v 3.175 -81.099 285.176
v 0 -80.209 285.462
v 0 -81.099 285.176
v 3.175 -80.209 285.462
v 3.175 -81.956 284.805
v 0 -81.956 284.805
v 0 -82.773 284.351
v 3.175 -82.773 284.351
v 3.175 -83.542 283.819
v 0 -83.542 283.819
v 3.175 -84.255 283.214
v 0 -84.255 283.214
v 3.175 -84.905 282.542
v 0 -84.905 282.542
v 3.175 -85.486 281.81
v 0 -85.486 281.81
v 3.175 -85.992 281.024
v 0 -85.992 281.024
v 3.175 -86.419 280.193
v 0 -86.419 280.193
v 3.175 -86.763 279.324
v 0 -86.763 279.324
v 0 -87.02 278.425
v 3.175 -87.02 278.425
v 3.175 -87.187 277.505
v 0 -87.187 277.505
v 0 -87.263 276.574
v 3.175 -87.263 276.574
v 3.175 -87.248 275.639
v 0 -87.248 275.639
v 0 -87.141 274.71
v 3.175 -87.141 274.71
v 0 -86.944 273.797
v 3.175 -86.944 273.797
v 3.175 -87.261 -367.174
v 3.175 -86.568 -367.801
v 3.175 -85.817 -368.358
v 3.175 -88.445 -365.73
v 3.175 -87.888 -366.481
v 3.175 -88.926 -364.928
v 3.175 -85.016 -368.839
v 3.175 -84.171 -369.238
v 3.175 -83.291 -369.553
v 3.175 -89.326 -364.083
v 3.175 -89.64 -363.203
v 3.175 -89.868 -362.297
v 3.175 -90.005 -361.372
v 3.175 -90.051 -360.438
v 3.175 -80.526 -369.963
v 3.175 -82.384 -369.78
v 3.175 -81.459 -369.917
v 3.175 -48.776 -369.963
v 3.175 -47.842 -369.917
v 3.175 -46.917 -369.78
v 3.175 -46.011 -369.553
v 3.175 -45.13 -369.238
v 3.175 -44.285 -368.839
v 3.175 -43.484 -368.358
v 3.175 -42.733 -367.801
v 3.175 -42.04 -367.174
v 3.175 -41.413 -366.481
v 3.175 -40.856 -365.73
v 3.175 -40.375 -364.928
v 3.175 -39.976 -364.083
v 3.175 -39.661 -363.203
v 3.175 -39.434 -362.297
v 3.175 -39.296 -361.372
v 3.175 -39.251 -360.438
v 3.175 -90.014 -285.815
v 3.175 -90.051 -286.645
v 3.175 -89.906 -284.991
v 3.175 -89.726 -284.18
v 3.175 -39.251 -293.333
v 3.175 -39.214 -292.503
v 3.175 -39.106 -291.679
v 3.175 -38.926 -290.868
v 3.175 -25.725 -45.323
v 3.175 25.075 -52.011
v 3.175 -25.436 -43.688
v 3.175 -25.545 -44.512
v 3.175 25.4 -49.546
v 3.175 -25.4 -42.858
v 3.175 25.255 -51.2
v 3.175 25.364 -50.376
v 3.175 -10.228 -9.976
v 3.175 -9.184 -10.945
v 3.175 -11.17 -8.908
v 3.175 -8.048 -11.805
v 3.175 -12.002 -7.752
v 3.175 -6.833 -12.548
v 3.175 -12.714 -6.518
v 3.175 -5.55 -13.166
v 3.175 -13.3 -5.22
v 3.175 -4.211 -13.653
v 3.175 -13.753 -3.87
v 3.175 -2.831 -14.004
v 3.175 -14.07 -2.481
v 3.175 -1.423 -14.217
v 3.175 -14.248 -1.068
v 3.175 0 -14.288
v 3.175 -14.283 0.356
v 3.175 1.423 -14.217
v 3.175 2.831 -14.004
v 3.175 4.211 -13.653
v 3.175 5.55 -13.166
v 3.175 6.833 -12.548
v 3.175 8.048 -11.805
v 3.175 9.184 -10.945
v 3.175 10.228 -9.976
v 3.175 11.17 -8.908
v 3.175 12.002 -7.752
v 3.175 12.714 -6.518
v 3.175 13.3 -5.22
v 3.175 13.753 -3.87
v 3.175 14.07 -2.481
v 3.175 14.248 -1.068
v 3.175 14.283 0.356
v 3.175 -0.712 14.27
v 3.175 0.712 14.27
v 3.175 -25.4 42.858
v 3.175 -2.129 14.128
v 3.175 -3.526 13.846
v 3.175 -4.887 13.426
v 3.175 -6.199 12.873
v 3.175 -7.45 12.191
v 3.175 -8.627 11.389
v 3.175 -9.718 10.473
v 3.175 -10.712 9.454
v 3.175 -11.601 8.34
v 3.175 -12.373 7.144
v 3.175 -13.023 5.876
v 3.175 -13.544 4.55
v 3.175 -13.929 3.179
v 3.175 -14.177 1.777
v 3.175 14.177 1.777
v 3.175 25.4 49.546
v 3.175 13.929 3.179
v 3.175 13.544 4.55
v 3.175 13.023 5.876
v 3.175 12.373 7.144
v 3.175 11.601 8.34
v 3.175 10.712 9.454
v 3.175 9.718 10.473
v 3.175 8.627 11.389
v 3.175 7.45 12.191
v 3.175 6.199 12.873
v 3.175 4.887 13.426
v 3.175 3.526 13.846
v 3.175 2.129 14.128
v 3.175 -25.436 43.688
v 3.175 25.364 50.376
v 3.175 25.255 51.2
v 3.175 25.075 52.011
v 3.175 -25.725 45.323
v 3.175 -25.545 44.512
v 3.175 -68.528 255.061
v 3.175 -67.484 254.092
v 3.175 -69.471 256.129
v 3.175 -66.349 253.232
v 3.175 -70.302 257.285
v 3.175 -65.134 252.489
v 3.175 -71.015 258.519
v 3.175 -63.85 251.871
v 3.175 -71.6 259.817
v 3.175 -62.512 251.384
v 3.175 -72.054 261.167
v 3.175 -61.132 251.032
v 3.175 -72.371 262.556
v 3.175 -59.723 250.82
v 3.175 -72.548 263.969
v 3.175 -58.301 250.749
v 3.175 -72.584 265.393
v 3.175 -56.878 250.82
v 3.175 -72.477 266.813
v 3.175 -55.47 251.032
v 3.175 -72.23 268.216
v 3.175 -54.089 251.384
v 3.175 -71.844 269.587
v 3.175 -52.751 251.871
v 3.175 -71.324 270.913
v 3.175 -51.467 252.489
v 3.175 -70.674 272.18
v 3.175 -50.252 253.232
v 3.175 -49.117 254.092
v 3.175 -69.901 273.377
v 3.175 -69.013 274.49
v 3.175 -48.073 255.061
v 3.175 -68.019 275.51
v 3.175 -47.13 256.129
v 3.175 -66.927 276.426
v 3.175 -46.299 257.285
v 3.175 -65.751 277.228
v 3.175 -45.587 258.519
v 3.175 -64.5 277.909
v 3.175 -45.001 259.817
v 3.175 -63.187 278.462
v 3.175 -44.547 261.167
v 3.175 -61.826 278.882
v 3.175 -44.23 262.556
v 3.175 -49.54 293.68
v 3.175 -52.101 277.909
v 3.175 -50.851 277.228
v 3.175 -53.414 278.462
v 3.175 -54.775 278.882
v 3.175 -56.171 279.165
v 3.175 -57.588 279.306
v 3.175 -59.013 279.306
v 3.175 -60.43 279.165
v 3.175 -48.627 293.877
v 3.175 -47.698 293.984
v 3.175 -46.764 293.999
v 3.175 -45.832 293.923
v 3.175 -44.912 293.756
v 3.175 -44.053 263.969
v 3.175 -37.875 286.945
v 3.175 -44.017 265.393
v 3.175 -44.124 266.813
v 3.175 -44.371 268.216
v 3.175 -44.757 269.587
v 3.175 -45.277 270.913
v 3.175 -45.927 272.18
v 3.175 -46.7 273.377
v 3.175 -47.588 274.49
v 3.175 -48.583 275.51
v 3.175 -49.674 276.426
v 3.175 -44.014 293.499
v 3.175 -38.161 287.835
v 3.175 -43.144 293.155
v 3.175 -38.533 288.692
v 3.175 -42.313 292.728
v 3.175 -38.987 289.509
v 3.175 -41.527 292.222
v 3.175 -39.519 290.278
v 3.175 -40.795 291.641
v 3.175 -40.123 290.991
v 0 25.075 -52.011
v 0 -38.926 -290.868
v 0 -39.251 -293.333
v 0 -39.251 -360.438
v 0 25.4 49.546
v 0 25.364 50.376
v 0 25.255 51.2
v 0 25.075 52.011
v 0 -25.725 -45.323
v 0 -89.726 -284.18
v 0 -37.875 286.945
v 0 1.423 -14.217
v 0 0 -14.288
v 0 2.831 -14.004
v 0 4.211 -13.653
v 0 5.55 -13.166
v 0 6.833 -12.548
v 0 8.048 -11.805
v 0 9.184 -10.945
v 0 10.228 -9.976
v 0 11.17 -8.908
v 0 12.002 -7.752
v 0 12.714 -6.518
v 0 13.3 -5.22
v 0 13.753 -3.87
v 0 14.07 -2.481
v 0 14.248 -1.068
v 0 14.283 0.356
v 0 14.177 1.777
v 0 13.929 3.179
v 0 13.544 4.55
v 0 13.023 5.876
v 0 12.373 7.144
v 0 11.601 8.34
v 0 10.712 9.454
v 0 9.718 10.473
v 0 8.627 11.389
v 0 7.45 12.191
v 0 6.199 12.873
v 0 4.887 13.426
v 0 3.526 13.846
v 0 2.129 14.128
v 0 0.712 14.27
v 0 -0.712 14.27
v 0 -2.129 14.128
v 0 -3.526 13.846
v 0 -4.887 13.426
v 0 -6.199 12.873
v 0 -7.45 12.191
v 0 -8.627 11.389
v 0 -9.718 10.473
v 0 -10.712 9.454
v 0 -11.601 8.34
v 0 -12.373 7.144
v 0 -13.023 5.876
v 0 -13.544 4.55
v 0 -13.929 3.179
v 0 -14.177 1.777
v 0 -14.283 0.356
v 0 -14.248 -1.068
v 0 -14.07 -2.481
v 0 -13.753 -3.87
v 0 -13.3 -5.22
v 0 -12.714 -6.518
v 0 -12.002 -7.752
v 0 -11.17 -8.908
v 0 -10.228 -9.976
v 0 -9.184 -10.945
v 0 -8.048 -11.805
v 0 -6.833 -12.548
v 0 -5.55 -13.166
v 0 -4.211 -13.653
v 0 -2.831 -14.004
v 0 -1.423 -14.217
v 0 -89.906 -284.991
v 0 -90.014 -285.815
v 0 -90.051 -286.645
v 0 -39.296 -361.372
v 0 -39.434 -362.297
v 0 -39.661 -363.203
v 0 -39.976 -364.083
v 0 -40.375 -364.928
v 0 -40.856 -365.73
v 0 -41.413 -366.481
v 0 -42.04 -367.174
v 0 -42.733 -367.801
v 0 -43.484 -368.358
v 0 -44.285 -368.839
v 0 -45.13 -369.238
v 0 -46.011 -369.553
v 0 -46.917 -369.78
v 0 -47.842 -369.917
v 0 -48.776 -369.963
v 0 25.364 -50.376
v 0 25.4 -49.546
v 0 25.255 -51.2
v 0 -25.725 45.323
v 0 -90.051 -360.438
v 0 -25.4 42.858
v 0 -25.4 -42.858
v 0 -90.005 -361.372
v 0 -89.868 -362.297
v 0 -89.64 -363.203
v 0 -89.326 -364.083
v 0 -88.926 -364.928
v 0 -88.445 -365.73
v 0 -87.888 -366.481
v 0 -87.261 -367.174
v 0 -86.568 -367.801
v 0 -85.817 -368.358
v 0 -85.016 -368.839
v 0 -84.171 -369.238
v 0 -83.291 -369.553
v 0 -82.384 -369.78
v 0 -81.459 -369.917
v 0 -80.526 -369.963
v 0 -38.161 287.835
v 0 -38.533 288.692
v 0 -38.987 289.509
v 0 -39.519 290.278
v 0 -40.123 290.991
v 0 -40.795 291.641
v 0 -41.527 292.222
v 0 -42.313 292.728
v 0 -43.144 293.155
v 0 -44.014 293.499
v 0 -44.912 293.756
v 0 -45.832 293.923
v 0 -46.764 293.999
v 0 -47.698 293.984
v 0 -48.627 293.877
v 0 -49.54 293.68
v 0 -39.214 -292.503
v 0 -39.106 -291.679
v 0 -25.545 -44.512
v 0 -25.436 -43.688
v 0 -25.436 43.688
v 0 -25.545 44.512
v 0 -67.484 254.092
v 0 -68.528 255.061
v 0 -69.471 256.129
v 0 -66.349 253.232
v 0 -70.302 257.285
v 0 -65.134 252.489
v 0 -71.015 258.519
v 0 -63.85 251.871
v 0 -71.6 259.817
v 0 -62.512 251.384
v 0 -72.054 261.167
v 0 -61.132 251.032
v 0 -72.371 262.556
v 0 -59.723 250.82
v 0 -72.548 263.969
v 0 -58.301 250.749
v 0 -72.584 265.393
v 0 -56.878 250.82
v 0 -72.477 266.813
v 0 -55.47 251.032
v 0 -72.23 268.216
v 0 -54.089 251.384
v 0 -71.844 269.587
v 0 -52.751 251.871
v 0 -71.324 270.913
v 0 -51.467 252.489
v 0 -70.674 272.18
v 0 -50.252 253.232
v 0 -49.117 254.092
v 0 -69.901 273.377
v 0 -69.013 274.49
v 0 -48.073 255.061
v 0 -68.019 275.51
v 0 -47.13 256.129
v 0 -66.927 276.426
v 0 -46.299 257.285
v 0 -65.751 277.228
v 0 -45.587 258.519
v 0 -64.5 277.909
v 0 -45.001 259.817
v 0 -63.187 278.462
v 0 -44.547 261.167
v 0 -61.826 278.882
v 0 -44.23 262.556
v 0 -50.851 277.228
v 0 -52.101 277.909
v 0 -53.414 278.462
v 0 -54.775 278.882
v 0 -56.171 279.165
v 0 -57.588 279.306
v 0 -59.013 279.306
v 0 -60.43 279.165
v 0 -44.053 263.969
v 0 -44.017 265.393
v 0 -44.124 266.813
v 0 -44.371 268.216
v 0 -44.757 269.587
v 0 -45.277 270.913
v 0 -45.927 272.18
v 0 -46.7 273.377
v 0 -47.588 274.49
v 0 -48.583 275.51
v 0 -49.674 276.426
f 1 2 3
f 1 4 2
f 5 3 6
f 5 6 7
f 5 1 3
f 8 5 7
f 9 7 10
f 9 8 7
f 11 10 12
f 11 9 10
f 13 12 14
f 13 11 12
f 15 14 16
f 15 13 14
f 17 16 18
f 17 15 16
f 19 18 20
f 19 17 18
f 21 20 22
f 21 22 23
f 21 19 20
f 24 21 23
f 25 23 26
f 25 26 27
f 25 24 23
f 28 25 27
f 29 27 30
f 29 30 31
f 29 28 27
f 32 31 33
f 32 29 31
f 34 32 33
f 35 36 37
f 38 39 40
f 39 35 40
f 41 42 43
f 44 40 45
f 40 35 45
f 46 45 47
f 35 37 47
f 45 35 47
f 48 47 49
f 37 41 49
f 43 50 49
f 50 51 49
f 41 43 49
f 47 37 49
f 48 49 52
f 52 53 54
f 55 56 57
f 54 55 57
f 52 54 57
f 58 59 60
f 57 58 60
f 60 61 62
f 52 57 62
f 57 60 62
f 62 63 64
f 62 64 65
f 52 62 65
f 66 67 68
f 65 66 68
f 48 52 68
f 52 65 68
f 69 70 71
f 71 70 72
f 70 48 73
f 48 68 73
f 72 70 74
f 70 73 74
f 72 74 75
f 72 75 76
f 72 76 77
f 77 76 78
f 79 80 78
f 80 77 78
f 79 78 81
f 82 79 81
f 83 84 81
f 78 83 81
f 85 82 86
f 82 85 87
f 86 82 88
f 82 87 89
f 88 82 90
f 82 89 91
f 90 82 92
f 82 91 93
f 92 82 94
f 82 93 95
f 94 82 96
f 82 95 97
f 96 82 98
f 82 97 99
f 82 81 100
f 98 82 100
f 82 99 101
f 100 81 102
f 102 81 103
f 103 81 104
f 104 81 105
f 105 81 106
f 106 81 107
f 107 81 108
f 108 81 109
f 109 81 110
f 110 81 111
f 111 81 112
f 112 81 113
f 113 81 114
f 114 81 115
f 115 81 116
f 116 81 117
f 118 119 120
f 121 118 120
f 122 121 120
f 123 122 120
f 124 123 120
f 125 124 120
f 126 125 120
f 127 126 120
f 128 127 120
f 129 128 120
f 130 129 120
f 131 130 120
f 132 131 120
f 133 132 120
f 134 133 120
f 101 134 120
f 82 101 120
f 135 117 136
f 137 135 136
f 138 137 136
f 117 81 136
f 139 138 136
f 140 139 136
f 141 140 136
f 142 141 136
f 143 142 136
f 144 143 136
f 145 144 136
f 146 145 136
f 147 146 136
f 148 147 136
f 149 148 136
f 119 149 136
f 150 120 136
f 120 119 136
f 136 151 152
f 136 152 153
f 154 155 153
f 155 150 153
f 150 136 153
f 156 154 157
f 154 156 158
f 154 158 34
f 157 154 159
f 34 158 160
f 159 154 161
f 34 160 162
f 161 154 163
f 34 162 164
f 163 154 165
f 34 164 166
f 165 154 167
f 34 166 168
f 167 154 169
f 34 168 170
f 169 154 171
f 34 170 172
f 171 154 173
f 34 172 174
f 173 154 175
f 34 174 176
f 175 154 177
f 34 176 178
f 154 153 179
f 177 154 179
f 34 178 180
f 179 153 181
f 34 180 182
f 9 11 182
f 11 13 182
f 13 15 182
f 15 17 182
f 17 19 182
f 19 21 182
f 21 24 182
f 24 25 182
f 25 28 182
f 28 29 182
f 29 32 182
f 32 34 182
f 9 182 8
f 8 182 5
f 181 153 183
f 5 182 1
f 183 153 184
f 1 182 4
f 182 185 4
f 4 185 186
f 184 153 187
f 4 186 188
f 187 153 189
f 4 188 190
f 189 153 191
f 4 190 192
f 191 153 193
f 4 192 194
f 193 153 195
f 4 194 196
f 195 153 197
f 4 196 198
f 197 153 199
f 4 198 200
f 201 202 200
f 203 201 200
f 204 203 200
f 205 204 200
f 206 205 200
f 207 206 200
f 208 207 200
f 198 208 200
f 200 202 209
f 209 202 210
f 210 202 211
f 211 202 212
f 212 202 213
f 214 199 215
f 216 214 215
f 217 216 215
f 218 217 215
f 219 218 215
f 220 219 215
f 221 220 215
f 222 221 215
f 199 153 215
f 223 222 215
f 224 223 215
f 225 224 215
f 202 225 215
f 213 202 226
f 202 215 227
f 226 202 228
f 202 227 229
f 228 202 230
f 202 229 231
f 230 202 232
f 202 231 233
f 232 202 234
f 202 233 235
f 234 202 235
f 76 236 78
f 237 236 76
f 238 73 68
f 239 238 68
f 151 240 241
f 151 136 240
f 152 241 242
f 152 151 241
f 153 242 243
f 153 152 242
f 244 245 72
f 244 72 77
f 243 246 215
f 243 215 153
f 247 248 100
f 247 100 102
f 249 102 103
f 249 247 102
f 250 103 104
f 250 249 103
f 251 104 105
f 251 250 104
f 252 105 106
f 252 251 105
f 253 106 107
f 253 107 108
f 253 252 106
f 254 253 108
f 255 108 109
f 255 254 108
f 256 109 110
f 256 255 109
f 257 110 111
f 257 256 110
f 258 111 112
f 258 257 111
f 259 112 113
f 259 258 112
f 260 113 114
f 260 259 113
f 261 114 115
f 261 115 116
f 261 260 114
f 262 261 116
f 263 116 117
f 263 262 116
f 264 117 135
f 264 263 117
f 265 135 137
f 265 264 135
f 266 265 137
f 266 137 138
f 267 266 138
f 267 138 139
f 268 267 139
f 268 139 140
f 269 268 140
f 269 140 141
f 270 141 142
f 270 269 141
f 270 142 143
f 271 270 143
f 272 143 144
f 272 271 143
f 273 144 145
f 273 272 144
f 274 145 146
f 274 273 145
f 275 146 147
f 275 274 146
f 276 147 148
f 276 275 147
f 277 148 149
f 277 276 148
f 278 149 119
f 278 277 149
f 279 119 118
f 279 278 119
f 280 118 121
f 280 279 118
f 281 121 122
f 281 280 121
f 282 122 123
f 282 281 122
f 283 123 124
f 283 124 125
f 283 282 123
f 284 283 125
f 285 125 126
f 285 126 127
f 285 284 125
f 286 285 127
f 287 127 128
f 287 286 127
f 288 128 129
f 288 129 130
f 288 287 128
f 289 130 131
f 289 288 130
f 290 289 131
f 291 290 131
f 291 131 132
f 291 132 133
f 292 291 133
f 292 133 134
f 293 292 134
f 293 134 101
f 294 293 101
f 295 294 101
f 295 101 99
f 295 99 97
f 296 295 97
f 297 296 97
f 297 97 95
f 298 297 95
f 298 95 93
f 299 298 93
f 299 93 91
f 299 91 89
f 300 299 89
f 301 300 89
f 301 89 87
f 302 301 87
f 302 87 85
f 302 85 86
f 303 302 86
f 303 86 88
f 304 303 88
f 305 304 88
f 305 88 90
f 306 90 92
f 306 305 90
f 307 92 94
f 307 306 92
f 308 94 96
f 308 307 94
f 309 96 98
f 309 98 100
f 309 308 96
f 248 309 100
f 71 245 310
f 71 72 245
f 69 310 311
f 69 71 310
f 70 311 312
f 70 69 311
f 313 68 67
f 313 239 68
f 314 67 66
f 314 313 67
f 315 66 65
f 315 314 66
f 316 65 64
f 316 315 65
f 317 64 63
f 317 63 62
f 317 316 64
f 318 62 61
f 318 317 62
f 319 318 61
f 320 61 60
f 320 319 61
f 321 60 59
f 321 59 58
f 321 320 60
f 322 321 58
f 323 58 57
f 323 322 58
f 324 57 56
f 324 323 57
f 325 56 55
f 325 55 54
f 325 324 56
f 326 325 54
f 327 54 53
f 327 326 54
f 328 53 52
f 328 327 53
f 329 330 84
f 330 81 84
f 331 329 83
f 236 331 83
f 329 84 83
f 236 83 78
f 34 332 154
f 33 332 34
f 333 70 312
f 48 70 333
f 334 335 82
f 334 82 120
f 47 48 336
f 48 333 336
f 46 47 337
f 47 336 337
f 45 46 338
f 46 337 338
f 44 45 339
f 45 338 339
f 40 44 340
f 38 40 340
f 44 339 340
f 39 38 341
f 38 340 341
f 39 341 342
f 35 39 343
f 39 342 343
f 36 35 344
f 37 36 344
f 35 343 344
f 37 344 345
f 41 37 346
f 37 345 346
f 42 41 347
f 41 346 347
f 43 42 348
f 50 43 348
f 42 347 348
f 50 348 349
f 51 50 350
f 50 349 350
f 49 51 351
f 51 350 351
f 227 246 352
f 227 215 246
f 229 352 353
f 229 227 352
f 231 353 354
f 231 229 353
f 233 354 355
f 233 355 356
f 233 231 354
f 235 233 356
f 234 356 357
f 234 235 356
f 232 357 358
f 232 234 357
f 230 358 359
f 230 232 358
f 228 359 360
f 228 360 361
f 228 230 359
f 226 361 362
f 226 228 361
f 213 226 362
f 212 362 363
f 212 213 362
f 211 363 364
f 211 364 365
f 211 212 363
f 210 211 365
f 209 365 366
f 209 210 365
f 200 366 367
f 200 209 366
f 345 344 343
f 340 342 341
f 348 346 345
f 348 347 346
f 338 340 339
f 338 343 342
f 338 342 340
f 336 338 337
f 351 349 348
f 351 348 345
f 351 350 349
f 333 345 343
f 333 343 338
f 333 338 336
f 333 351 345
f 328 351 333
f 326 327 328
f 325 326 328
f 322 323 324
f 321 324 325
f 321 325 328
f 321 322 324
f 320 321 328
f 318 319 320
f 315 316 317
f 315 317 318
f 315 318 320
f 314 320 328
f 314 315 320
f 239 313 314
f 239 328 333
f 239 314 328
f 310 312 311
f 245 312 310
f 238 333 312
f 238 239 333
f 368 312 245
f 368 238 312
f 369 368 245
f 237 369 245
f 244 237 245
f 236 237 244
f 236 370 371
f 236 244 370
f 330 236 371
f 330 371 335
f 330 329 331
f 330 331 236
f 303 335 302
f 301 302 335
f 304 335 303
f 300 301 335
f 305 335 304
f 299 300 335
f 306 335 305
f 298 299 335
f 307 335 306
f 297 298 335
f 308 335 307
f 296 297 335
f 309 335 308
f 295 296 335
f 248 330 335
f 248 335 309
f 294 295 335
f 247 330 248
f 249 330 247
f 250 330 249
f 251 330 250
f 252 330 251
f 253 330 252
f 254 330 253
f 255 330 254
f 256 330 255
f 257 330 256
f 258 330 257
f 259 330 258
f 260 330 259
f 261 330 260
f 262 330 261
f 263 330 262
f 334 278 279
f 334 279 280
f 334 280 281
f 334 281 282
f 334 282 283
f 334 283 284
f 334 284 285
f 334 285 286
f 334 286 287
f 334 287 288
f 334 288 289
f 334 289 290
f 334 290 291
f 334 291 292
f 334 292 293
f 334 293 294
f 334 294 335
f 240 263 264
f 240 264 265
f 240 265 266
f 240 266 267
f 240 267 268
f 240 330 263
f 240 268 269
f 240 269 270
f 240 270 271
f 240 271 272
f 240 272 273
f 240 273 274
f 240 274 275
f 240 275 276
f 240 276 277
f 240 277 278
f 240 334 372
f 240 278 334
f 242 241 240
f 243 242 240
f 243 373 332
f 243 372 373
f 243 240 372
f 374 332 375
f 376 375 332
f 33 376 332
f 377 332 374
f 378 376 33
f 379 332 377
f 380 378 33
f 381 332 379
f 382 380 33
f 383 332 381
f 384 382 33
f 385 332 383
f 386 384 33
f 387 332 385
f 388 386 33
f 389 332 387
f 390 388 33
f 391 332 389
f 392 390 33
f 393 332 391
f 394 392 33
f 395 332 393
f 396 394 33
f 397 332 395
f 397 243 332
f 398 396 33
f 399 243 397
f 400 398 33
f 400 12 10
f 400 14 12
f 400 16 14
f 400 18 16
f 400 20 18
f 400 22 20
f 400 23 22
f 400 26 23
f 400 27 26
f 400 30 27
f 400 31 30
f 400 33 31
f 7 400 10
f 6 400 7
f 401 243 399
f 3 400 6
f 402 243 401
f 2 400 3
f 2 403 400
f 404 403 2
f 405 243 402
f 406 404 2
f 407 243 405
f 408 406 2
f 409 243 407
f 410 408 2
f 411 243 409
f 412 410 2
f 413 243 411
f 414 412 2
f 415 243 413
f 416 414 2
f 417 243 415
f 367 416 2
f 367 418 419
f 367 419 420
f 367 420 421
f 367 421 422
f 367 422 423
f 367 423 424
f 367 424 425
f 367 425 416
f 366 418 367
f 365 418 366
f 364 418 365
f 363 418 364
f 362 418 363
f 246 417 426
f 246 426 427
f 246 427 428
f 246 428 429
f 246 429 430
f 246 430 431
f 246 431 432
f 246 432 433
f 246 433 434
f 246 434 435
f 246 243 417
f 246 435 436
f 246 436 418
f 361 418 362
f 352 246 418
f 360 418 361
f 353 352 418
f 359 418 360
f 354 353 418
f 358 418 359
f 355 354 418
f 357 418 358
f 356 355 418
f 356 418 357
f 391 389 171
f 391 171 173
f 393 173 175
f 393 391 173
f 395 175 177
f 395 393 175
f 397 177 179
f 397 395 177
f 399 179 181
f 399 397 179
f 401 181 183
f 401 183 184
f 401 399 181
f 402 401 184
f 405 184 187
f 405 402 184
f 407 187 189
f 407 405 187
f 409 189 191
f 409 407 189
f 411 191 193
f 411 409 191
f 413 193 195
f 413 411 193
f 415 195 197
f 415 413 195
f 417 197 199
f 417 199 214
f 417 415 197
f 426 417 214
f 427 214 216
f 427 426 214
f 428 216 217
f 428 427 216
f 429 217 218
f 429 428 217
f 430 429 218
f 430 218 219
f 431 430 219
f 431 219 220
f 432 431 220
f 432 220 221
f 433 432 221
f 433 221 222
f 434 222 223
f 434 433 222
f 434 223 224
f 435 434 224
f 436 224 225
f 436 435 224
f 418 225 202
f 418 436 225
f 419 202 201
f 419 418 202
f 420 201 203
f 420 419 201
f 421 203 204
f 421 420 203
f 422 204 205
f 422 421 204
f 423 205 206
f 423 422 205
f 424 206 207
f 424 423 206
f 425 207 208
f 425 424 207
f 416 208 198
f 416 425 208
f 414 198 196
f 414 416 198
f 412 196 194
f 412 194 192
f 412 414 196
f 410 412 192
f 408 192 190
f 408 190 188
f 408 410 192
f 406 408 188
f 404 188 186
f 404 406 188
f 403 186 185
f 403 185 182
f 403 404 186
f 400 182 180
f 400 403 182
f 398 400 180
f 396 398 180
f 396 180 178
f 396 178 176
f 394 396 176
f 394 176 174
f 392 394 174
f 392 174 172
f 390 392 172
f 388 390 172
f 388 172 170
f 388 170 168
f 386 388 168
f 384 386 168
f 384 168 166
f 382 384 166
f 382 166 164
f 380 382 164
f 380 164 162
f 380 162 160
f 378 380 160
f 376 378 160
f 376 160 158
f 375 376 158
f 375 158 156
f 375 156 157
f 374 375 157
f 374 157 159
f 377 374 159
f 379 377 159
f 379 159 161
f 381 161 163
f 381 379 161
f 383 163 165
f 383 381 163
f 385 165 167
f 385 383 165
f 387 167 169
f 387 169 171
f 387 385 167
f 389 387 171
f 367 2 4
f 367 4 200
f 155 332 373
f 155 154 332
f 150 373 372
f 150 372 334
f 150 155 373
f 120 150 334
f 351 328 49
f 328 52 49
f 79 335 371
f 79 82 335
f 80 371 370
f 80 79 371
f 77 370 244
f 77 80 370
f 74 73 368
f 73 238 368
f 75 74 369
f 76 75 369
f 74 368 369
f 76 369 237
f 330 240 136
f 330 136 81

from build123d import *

# Parameters (mm, degrees)
SKETCH1_R           = 14.2875
BOSS_EXTRUDE1_DEPTH = 3.175
SKETCH3_R           = 12.7
CUT_EXTRUDE2_DEPTH  = 4.175
SKETCH5_W           = 50.8
SKETCH5_H           = 247.65
CUT_EXTRUDE4_DEPTH  = 4.175
SKETCH6_W           = 127
SKETCH6_H           = 25.4
CUT_EXTRUDE5_DEPTH  = 4.175
BOSS_EXTRUDE2_DEPTH = 3.175
FILLET1_R           = 9.525


with BuildPart() as part:
    # Sketch1 → Boss-Extrude1 (new body)
    with BuildSketch(Plane(origin=(0, 0, 0), x_dir=(0, 0, -1), z_dir=(1, 0, 0))):
        Polygon((-50.8, 25.4), (50.8, 25.4), (369.963359856, -60.119564527), (369.963359856, -337.700549698), (319.163359856, -337.700549698), (319.163359856, -99.099775516), (44.112053123, -25.4), (-44.112053123, -25.4), (-282.997152386, -89.409069432), (-296.145159877, -40.340037456), align=None)
        with Locations((-265.036640144, -58.300549698)):
            Circle(SKETCH1_R, mode=Mode.SUBTRACT)
        Circle(SKETCH1_R, mode=Mode.SUBTRACT)
    extrude(amount=BOSS_EXTRUDE1_DEPTH)

    # Sketch3 → Cut-Extrude2 (cut, through all)
    with BuildSketch(Plane(origin=(3.175, 0, 0), x_dir=(0, 0, -1), z_dir=(1, 0, 0))):
        with Locations((344.563359856, -312.300549698)):
            Circle(SKETCH3_R)
    extrude(amount=-CUT_EXTRUDE2_DEPTH, mode=Mode.SUBTRACT)

    # Sketch5 → Cut-Extrude4 (cut, through all)
    with BuildSketch(Plane(origin=(3.175, 0, 0), x_dir=(0, 0, -1), z_dir=(1, 0, 0))):
        with Locations((344.563359856, -213.875549698)):
            Rectangle(SKETCH5_W, SKETCH5_H)
    extrude(amount=-CUT_EXTRUDE4_DEPTH, mode=Mode.SUBTRACT)

    # Sketch6 → Cut-Extrude5 (cut, through all)
    with BuildSketch(Plane(origin=(3.175, 0, 0), x_dir=(0, 0, -1), z_dir=(1, 0, 0))):
        with Locations((306.463359856, -102.750549698)):
            Rectangle(SKETCH6_W, SKETCH6_H)
    extrude(amount=-CUT_EXTRUDE5_DEPTH, mode=Mode.SUBTRACT)

    # Sketch7 → Boss-Extrude2 (add)
    with BuildSketch(Plane(origin=(3.175, 0, 0), x_dir=(0, 0, -1), z_dir=(1, 0, 0))):
        Polygon((292.079136211, -39.250549698), (369.963359856, -39.250549698), (369.963359856, -60.119564527), align=None)
    extrude(amount=-BOSS_EXTRUDE2_DEPTH)

    # Fillet1
    fillet1_edges = [part.edges().sort_by_distance(p)[0] for p in [
        (1.5875, 25.4, 50.8),
        (1.5875, 25.4, -50.8),
        (1.5875, -25.4, -44.112053123),
        (1.5875, -25.4, 44.112053123),
        (1.5875, -89.409069432, 282.997152386),
        (1.5875, -40.340037456, 296.145159877),
        (1.5875, -90.050549698, -369.963359856),
        (1.5875, -90.050549698, -285.391189333),
        (1.5875, -39.250549698, -292.079136211),
        (1.5875, -39.250549698, -369.963359856),
    ]]
    fillet(fillet1_edges, radius=FILLET1_R)


solid = part.part
